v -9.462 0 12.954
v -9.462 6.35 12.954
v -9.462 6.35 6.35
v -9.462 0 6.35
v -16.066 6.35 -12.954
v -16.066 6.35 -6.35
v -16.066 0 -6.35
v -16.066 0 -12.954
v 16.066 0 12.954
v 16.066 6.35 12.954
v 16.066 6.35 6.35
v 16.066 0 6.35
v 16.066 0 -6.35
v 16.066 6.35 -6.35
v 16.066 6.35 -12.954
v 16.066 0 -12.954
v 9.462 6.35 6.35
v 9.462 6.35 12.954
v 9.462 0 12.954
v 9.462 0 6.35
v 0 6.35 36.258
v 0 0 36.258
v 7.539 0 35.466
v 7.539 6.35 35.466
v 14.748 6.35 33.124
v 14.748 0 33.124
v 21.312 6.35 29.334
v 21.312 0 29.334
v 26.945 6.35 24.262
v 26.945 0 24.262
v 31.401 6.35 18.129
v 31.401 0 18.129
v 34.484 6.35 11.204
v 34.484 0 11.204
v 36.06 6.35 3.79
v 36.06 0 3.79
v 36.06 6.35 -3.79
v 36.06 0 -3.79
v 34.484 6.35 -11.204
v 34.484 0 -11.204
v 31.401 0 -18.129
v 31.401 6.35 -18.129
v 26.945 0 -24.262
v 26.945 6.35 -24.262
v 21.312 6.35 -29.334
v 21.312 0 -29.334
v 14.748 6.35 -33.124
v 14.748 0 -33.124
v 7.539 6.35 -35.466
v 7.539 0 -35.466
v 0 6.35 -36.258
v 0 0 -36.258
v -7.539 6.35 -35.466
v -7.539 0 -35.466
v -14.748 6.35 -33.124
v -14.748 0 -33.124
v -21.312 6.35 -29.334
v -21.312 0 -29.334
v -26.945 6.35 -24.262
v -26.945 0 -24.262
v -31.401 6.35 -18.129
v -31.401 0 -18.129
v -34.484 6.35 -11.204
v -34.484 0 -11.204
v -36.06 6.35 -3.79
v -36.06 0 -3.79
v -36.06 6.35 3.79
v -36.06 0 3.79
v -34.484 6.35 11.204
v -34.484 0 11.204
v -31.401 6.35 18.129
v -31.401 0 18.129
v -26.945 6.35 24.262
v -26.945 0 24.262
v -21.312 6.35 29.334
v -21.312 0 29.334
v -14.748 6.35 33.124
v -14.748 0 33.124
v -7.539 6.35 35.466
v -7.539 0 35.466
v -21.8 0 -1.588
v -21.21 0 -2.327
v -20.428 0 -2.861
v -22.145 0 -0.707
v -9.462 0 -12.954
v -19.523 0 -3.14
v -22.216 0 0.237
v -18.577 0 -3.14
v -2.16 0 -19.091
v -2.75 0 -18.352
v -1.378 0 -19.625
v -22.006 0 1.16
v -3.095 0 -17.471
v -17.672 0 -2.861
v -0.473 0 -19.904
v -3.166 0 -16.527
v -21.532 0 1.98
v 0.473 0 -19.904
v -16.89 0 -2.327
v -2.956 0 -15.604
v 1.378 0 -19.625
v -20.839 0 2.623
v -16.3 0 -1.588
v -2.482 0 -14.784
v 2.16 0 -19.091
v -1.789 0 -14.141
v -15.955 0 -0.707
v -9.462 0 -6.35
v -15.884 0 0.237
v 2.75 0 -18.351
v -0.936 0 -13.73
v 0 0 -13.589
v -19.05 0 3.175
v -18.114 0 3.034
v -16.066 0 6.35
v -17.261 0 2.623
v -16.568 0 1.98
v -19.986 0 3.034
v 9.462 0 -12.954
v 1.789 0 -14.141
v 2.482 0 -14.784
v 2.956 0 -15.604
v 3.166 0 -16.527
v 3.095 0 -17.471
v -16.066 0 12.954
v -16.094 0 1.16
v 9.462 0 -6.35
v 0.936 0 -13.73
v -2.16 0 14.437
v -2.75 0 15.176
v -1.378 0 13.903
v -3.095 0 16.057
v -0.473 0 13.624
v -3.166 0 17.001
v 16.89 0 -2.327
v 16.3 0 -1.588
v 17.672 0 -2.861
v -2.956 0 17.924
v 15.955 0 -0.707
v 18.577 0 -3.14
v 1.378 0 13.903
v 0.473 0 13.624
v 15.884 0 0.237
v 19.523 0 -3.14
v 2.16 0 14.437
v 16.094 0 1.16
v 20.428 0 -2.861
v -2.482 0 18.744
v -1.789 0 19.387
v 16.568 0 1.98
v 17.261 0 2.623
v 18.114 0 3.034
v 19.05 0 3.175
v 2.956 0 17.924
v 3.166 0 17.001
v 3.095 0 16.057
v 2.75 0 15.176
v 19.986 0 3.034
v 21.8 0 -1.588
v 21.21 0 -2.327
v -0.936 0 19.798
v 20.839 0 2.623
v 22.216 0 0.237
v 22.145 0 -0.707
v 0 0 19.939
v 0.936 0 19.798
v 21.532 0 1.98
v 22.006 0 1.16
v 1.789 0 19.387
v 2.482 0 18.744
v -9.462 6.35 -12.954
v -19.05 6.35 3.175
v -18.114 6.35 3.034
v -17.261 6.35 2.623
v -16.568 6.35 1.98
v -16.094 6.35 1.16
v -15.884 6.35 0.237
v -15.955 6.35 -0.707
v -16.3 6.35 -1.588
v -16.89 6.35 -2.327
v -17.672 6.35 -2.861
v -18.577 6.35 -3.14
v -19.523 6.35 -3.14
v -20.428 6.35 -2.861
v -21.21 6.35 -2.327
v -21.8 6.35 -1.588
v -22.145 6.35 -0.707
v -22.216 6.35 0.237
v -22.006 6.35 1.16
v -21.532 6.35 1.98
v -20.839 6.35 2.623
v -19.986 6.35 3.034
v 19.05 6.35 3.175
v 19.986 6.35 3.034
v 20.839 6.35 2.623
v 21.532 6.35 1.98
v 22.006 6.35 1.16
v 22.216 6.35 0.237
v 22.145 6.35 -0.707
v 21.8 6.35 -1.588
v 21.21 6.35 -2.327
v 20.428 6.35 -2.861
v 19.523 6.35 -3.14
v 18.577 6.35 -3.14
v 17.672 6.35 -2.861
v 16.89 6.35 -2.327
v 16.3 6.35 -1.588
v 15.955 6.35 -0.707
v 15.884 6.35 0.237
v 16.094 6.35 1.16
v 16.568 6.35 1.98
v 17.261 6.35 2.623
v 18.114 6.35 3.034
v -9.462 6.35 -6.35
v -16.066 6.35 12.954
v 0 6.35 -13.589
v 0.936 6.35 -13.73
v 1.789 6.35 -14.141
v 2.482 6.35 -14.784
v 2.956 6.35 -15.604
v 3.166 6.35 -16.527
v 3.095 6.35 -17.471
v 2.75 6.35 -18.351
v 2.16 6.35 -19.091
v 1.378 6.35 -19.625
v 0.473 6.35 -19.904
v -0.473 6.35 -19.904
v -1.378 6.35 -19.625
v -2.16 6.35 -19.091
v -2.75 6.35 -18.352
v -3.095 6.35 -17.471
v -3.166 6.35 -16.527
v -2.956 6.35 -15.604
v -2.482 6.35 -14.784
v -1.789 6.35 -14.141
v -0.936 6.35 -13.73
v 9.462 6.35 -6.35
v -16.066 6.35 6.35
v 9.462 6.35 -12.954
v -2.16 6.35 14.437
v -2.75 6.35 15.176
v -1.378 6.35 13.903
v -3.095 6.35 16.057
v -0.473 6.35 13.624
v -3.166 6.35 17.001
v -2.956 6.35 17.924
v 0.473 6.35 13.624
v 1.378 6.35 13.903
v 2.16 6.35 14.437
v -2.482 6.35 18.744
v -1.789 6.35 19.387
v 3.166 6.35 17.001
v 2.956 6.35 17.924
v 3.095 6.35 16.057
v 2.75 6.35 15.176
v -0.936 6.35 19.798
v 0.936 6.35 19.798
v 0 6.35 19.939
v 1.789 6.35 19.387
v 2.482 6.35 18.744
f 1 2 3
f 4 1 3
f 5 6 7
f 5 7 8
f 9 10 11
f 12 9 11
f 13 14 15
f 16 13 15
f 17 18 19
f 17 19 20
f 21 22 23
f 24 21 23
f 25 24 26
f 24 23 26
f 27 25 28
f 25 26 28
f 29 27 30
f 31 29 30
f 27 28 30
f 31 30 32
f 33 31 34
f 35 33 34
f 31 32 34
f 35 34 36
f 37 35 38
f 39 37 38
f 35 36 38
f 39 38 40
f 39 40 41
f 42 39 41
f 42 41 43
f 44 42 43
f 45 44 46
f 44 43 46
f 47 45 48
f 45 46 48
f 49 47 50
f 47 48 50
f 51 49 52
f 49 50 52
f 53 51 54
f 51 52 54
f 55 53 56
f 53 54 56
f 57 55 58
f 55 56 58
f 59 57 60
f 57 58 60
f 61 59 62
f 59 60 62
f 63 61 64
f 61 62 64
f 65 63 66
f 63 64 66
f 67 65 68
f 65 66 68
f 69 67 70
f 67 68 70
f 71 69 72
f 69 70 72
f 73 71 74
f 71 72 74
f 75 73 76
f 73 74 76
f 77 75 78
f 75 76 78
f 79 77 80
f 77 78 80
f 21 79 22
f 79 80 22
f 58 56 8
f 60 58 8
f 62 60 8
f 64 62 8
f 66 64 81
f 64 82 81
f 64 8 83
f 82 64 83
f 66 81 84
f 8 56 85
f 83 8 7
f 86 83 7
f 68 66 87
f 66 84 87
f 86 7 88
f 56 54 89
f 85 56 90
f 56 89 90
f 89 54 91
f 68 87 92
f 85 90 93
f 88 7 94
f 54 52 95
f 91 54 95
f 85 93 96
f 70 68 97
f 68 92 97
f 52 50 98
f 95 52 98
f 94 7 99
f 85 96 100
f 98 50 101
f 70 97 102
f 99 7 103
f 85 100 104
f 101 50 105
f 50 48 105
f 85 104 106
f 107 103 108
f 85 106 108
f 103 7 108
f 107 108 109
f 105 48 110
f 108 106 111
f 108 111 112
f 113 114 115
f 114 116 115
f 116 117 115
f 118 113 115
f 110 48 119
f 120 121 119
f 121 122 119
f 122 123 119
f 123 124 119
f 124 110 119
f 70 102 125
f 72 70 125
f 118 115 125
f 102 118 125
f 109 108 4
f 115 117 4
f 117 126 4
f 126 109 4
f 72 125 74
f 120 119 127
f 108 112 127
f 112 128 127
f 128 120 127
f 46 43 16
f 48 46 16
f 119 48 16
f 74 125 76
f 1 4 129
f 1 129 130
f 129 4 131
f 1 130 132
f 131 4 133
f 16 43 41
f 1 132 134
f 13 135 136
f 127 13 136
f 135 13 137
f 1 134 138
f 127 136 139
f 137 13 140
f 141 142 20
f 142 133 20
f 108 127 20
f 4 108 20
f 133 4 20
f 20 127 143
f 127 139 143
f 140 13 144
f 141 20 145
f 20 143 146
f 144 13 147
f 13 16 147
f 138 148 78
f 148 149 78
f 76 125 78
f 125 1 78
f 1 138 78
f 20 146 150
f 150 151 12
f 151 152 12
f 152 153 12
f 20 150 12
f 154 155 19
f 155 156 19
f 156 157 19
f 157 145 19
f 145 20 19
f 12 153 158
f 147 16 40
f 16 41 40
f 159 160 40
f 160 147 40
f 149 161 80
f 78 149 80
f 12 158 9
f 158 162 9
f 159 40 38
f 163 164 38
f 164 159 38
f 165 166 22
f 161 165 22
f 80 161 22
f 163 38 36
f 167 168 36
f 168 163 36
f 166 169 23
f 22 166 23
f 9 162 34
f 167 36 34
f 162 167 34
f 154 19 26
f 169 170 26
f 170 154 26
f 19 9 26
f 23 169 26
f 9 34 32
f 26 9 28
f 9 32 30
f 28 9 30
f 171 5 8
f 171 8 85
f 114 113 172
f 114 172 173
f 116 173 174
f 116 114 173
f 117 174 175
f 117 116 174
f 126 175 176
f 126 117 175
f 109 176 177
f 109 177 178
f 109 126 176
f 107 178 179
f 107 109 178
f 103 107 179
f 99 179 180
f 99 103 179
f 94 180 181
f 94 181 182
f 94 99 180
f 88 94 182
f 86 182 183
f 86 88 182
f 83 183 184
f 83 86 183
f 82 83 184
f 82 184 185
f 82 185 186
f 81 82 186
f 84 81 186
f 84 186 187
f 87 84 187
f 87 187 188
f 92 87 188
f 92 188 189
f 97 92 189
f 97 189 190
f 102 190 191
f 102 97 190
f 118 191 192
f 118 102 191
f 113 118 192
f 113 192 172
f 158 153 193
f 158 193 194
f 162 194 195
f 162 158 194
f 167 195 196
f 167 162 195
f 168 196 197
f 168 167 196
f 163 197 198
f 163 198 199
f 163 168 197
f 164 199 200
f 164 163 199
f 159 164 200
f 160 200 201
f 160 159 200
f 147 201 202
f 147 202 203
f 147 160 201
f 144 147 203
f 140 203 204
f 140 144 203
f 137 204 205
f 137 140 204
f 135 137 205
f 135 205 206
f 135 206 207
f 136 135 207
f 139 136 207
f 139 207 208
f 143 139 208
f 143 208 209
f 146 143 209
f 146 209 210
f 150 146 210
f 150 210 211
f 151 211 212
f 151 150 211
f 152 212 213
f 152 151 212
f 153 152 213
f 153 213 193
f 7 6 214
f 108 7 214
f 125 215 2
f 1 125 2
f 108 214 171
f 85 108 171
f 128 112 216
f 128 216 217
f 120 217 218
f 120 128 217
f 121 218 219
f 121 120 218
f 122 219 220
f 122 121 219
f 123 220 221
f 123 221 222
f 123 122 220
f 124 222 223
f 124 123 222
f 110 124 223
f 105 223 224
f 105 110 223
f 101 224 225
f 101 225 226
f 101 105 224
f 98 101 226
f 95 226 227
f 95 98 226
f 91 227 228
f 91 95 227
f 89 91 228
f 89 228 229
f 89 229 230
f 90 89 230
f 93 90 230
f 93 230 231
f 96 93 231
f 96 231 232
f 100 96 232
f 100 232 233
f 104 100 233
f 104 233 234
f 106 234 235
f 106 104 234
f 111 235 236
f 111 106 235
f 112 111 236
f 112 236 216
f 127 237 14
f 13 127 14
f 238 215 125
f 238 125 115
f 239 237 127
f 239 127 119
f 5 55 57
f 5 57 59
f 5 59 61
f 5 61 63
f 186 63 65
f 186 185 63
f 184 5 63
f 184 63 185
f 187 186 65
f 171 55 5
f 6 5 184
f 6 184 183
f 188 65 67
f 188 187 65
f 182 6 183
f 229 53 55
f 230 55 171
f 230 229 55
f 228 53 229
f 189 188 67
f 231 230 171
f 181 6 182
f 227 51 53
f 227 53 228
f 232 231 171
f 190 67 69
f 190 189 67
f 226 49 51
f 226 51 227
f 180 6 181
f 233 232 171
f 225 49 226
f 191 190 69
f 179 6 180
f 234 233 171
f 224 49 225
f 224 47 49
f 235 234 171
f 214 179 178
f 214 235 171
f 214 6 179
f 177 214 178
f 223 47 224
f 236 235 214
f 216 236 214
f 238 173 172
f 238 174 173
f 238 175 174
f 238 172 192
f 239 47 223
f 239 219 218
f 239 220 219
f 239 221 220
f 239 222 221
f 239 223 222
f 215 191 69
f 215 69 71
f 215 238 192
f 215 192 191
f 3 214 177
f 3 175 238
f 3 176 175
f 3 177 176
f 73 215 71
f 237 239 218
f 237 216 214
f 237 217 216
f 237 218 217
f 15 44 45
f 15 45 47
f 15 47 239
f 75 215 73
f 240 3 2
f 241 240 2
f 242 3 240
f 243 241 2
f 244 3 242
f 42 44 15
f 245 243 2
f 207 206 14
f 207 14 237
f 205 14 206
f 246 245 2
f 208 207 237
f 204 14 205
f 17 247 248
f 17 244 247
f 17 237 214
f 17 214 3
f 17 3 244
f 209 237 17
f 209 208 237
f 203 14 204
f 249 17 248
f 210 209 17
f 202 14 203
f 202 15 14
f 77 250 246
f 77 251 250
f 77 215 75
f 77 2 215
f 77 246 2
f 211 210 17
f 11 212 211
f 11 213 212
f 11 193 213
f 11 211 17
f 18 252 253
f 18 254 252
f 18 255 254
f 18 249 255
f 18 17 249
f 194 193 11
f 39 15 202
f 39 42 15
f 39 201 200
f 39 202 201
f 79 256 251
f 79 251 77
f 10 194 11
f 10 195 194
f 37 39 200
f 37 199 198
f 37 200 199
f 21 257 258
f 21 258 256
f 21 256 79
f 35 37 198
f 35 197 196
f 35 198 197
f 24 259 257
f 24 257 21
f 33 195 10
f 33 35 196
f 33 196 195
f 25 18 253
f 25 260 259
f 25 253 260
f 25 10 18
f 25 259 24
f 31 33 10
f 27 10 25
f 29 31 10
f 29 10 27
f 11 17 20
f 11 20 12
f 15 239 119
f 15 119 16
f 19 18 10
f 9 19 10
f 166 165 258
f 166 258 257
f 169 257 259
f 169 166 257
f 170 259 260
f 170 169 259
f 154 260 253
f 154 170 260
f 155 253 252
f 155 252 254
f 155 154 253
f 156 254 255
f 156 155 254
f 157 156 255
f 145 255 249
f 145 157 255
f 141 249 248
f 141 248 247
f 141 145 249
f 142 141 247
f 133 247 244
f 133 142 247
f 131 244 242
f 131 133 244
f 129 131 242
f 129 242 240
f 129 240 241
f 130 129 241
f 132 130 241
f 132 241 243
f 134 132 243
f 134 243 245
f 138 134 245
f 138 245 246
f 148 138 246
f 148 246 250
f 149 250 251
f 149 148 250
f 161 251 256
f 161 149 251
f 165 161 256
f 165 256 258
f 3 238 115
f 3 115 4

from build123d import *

# Parameters (mm, degrees)
SKETCH1_R           = 36.2585
SKETCH1_R_2         = 3.175
BOSS_EXTRUDE1_DEPTH = 6.35
SKETCH2_W           = 6.604
SKETCH2_H           = 6.604
CUT_EXTRUDE1_DEPTH  = 10.16


with BuildPart() as part:
    # Sketch1 → Boss-Extrude1 (new body)
    with BuildSketch(Plane(origin=(0, 0, 0), x_dir=(1, 0, 0), z_dir=(0, 1, 0))):
        with Locations(Location((0, 0, 0), (0, 0, 270))):
            Circle(SKETCH1_R)
        with Locations(Location((0, 16.764, 0), (0, 0, 270))):
            Circle(SKETCH1_R_2, mode=Mode.SUBTRACT)
        with Locations(Location((0, -16.764, 0), (0, 0, 270))):
            Circle(SKETCH1_R_2, mode=Mode.SUBTRACT)
        with Locations(Location((-19.05, 0, 0), (0, 0, 270))):
            Circle(SKETCH1_R_2, mode=Mode.SUBTRACT)
        with Locations(Location((19.05, 0, 0), (0, 0, 270))):
            Circle(SKETCH1_R_2, mode=Mode.SUBTRACT)
    extrude(amount=BOSS_EXTRUDE1_DEPTH)

    # Sketch2 → Cut-Extrude1 (cut)
    with BuildSketch(Plane(origin=(0, 6.35, 0), x_dir=(1, 0, 0), z_dir=(0, 1, 0))):
        with Locations((-12.7635, 9.652)):
            Rectangle(SKETCH2_W, SKETCH2_H)
        with Locations((-12.7635, -9.652)):
            Rectangle(SKETCH2_W, SKETCH2_H)
        with Locations((12.7635, 9.652)):
            Rectangle(SKETCH2_W, SKETCH2_H)
        with Locations((12.7635, -9.652)):
            Rectangle(SKETCH2_W, SKETCH2_H)
    extrude(amount=-CUT_EXTRUDE1_DEPTH, mode=Mode.SUBTRACT)


solid = part.part
